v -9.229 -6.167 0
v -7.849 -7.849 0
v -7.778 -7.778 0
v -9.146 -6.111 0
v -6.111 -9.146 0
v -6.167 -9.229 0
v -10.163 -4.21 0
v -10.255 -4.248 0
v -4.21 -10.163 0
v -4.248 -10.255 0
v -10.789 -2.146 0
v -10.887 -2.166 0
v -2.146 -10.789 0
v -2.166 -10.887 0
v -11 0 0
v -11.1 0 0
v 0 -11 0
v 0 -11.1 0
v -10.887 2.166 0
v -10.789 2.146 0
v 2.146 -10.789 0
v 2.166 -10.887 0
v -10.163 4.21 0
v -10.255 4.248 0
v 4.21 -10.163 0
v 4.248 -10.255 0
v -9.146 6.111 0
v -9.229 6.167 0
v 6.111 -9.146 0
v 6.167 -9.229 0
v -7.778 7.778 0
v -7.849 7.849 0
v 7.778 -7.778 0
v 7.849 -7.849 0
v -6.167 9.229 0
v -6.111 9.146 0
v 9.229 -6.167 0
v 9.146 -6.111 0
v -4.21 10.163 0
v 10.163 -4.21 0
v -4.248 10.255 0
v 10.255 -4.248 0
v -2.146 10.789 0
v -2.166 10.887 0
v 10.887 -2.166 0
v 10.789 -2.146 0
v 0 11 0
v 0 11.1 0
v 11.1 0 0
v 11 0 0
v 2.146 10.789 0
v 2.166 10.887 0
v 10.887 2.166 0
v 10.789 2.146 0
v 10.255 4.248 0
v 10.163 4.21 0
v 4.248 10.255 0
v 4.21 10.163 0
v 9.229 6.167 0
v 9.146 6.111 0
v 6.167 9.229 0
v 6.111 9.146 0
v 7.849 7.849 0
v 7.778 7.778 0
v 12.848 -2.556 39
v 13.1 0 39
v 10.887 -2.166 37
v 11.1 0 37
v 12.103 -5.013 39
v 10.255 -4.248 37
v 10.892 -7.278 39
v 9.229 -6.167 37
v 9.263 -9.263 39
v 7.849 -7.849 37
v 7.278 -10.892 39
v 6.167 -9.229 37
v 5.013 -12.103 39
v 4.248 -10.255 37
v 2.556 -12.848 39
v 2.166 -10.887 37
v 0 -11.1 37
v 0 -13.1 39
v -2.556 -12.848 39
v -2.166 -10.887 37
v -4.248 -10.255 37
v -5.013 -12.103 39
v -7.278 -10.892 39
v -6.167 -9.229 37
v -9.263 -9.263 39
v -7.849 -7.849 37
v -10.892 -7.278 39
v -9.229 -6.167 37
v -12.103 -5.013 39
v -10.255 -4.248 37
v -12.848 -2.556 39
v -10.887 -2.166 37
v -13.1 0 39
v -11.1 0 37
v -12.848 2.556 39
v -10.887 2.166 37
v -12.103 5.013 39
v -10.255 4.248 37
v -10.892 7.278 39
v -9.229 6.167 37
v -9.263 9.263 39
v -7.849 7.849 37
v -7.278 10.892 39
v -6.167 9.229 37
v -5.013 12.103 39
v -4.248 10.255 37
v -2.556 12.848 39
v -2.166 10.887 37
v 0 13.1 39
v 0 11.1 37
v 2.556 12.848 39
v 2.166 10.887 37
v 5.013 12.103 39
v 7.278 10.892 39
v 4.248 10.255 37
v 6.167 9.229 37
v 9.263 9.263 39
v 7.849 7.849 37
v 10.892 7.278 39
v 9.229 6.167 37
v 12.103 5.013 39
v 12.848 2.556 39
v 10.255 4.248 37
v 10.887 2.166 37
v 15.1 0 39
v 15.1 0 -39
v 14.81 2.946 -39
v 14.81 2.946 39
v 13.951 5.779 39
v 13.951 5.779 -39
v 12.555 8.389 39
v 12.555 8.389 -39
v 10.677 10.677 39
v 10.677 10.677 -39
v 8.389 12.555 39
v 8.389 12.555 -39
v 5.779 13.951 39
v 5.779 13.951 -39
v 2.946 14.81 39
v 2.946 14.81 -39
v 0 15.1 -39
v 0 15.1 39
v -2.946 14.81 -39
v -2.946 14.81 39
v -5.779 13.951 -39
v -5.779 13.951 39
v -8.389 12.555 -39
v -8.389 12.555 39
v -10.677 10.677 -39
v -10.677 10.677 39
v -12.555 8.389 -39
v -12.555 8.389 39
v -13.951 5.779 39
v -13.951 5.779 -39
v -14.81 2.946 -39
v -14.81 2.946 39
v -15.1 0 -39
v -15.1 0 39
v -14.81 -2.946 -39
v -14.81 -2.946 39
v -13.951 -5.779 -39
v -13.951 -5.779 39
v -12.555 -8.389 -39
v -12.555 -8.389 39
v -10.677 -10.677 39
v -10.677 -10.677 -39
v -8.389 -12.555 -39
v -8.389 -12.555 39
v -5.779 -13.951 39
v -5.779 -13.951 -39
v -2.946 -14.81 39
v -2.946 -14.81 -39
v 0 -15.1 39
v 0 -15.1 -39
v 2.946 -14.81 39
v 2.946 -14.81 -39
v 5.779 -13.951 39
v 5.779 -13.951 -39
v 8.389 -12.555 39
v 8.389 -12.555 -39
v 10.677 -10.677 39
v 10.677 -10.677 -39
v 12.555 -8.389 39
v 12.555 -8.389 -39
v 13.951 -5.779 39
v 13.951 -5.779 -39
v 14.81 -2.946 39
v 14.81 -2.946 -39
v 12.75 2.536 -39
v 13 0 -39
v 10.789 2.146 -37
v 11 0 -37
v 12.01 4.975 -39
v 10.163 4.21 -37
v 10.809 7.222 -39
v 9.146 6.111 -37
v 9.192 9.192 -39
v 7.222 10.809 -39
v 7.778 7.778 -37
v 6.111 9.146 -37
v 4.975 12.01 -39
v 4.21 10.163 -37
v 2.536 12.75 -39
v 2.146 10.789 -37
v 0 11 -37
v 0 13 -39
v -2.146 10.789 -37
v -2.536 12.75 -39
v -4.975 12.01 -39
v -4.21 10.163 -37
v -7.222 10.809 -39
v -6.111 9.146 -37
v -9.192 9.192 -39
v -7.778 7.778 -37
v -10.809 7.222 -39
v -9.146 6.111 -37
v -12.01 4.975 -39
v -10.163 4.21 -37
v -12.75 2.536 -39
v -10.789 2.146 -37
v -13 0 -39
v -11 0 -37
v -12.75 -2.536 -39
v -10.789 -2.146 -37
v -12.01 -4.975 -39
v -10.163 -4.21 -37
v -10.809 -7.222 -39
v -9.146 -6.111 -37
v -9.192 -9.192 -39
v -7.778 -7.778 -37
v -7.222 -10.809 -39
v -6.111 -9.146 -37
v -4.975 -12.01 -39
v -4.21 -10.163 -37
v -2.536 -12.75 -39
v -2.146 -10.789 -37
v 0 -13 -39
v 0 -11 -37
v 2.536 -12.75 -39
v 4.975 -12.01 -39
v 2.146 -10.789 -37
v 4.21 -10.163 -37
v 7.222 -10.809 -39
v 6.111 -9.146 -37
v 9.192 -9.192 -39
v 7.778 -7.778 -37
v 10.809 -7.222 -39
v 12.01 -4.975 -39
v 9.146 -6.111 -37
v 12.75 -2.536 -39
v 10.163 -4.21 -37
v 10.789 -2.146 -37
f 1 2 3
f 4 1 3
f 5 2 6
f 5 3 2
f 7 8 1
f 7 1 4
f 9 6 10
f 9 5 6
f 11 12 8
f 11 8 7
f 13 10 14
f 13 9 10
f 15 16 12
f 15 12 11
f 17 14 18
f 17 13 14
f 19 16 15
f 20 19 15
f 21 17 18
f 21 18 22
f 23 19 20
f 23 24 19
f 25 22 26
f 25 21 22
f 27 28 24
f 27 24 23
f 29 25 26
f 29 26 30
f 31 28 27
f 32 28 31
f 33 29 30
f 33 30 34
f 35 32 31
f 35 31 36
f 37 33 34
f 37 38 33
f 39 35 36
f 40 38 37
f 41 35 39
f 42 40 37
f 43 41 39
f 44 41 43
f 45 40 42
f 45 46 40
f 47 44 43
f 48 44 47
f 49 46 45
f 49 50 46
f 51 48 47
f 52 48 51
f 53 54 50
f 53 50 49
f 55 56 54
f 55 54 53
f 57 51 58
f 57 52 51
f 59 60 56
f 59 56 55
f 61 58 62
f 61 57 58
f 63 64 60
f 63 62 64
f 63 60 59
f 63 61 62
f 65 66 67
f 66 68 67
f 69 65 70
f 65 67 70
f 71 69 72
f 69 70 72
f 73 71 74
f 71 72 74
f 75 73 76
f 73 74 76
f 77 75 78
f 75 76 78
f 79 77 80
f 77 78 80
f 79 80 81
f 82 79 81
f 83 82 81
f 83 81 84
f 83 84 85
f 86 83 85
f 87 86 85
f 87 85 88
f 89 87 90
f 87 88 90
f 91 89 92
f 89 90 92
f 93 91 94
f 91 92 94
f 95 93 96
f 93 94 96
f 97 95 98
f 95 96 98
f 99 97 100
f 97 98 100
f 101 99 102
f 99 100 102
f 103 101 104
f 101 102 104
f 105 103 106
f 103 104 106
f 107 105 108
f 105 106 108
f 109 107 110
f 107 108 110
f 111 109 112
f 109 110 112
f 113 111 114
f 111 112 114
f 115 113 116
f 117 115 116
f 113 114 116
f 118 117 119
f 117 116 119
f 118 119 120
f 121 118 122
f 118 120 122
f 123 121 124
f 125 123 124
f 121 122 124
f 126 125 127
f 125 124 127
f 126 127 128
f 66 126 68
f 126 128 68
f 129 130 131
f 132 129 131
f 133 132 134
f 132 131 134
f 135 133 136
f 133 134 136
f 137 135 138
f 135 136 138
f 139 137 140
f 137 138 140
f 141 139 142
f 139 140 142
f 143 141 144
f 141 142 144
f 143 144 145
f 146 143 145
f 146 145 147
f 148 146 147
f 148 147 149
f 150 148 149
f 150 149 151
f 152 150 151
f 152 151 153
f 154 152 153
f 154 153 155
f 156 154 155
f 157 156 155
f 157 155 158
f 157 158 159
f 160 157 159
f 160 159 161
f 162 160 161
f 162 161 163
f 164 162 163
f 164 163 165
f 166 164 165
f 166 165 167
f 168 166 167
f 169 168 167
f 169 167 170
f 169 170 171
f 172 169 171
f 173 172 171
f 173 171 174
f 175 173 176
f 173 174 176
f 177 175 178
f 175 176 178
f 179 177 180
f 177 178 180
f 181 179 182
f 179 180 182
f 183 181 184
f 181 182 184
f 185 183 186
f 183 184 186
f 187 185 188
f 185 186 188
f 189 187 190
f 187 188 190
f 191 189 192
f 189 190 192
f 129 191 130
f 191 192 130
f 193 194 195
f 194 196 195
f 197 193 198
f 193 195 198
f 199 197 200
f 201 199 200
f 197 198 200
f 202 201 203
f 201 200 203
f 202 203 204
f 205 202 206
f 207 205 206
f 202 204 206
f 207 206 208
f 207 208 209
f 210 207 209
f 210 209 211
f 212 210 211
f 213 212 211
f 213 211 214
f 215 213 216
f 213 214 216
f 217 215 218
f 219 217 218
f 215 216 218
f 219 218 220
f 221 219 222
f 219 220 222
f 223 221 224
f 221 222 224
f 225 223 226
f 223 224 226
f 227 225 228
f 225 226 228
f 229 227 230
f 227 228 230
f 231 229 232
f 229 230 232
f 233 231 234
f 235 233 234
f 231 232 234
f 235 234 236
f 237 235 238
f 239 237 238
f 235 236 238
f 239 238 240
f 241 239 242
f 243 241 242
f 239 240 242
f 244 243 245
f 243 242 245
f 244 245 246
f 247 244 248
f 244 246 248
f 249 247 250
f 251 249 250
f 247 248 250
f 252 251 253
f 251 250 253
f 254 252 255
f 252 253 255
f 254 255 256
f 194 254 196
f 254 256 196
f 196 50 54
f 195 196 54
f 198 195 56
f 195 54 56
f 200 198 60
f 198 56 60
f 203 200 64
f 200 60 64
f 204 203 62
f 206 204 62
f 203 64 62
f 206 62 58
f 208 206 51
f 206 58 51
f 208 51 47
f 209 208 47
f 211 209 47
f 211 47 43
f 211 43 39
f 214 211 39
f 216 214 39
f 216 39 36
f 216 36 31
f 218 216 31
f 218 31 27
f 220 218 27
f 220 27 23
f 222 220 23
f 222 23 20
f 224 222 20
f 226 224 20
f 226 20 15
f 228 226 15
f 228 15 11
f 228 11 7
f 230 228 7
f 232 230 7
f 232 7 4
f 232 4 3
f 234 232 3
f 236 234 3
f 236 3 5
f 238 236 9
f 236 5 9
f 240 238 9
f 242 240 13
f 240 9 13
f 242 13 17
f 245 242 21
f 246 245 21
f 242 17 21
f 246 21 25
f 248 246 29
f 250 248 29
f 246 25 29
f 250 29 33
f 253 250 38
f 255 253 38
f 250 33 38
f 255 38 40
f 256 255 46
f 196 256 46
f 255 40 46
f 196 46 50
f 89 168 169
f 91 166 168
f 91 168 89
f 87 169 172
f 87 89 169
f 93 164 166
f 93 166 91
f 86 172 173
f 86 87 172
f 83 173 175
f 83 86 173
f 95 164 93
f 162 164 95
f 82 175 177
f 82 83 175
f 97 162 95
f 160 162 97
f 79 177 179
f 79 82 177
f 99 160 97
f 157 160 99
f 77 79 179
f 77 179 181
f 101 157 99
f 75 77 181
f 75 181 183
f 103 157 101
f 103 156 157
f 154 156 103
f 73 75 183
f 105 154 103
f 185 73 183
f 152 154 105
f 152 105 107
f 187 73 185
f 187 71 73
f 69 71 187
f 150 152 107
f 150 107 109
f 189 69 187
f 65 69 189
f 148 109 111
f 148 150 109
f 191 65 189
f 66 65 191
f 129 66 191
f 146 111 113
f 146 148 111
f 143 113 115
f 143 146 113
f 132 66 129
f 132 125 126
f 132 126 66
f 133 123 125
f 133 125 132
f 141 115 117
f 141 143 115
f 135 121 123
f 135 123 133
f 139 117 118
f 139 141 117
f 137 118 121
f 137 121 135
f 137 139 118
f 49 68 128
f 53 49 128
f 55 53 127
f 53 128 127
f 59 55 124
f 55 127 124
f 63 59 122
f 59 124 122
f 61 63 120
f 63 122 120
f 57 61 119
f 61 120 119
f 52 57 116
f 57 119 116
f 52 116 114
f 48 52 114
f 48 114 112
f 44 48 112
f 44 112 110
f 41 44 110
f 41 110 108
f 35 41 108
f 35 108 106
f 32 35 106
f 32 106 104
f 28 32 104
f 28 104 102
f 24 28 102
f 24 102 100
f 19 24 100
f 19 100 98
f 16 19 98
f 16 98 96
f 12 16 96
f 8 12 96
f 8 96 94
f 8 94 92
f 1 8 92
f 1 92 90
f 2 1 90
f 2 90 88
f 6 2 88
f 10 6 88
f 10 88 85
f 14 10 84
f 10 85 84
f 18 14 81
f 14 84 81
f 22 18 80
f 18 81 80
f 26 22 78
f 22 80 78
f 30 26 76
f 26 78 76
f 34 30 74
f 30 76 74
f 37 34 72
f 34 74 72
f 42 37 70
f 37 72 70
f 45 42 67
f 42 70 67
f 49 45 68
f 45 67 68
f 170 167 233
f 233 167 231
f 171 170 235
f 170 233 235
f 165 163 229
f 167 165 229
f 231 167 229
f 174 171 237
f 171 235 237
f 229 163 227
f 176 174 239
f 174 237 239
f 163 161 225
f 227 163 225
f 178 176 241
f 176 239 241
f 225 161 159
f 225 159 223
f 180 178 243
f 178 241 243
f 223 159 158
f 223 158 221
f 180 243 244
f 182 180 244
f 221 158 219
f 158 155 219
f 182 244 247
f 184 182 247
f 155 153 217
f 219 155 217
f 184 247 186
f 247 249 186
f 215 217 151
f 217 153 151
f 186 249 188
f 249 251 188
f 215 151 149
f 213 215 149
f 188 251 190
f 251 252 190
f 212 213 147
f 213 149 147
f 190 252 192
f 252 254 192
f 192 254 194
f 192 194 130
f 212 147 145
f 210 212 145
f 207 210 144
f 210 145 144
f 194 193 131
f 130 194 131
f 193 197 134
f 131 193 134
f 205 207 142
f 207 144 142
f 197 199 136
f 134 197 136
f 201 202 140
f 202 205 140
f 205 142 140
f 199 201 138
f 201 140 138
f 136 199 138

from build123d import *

# Parameters (mm, degrees)
SKETCH_1_R            = 15.1
EXTRUDE_1_DEPTH       = 39
SKETCH_4_R            = 11.1
CUT_EXTRUDE_475_DEPTH = 45.463693054
EXTRUDE_START         = -39
SKETCH_1_6_R          = 15.1
EXTRUDE_3_DEPTH       = 39
SKETCH_12_R           = 11
CUT_EXTRUDE_2_DEPTH   = 80


with BuildPart() as part:
    # 草图1 → 凸台-拉伸1 (new body)
    with BuildSketch(Plane.XY):
        Circle(SKETCH_1_R)
    extrude(amount=EXTRUDE_1_DEPTH)

    # 草图4 → Cut-Extrude 475 (cut, through all)
    with BuildSketch(Plane.XY.offset(39)):
        Circle(SKETCH_4_R)
    extrude(amount=-CUT_EXTRUDE_475_DEPTH, mode=Mode.SUBTRACT)

    # 草图8 → 切除-旋转1 (revolve, cut)
    with BuildSketch(Plane(origin=(0, 0, 0), x_dir=(1, 0, 0), z_dir=(0, 1, 0))):
        Polygon((-11.1, -37), (-11.1, -39), (-13.1, -39), align=None)
    revolve(axis=Axis((0, 0, 0), (0, 0, -1)), mode=Mode.SUBTRACT)

    # 草图1<6> → 凸台-拉伸3 (add)
    with BuildSketch(Plane.XY.offset(EXTRUDE_START)):
        Circle(SKETCH_1_6_R)
    extrude(amount=EXTRUDE_3_DEPTH)

    # 草图12 → 切除-拉伸2 (cut)
    with BuildSketch(Plane.XY):
        Circle(SKETCH_12_R)
    extrude(amount=-CUT_EXTRUDE_2_DEPTH, mode=Mode.SUBTRACT)

    # 草图14 → 切除-旋转2 (revolve, cut)
    with BuildSketch(Plane(origin=(0, 0, 0), x_dir=(1, 0, 0), z_dir=(0, 1, 0))):
        Polygon((11, 39), (13, 39), (11, 37), align=None)
    revolve(axis=Axis((0, 0, -39), (0, 0, 1)), mode=Mode.SUBTRACT)


solid = part.part
